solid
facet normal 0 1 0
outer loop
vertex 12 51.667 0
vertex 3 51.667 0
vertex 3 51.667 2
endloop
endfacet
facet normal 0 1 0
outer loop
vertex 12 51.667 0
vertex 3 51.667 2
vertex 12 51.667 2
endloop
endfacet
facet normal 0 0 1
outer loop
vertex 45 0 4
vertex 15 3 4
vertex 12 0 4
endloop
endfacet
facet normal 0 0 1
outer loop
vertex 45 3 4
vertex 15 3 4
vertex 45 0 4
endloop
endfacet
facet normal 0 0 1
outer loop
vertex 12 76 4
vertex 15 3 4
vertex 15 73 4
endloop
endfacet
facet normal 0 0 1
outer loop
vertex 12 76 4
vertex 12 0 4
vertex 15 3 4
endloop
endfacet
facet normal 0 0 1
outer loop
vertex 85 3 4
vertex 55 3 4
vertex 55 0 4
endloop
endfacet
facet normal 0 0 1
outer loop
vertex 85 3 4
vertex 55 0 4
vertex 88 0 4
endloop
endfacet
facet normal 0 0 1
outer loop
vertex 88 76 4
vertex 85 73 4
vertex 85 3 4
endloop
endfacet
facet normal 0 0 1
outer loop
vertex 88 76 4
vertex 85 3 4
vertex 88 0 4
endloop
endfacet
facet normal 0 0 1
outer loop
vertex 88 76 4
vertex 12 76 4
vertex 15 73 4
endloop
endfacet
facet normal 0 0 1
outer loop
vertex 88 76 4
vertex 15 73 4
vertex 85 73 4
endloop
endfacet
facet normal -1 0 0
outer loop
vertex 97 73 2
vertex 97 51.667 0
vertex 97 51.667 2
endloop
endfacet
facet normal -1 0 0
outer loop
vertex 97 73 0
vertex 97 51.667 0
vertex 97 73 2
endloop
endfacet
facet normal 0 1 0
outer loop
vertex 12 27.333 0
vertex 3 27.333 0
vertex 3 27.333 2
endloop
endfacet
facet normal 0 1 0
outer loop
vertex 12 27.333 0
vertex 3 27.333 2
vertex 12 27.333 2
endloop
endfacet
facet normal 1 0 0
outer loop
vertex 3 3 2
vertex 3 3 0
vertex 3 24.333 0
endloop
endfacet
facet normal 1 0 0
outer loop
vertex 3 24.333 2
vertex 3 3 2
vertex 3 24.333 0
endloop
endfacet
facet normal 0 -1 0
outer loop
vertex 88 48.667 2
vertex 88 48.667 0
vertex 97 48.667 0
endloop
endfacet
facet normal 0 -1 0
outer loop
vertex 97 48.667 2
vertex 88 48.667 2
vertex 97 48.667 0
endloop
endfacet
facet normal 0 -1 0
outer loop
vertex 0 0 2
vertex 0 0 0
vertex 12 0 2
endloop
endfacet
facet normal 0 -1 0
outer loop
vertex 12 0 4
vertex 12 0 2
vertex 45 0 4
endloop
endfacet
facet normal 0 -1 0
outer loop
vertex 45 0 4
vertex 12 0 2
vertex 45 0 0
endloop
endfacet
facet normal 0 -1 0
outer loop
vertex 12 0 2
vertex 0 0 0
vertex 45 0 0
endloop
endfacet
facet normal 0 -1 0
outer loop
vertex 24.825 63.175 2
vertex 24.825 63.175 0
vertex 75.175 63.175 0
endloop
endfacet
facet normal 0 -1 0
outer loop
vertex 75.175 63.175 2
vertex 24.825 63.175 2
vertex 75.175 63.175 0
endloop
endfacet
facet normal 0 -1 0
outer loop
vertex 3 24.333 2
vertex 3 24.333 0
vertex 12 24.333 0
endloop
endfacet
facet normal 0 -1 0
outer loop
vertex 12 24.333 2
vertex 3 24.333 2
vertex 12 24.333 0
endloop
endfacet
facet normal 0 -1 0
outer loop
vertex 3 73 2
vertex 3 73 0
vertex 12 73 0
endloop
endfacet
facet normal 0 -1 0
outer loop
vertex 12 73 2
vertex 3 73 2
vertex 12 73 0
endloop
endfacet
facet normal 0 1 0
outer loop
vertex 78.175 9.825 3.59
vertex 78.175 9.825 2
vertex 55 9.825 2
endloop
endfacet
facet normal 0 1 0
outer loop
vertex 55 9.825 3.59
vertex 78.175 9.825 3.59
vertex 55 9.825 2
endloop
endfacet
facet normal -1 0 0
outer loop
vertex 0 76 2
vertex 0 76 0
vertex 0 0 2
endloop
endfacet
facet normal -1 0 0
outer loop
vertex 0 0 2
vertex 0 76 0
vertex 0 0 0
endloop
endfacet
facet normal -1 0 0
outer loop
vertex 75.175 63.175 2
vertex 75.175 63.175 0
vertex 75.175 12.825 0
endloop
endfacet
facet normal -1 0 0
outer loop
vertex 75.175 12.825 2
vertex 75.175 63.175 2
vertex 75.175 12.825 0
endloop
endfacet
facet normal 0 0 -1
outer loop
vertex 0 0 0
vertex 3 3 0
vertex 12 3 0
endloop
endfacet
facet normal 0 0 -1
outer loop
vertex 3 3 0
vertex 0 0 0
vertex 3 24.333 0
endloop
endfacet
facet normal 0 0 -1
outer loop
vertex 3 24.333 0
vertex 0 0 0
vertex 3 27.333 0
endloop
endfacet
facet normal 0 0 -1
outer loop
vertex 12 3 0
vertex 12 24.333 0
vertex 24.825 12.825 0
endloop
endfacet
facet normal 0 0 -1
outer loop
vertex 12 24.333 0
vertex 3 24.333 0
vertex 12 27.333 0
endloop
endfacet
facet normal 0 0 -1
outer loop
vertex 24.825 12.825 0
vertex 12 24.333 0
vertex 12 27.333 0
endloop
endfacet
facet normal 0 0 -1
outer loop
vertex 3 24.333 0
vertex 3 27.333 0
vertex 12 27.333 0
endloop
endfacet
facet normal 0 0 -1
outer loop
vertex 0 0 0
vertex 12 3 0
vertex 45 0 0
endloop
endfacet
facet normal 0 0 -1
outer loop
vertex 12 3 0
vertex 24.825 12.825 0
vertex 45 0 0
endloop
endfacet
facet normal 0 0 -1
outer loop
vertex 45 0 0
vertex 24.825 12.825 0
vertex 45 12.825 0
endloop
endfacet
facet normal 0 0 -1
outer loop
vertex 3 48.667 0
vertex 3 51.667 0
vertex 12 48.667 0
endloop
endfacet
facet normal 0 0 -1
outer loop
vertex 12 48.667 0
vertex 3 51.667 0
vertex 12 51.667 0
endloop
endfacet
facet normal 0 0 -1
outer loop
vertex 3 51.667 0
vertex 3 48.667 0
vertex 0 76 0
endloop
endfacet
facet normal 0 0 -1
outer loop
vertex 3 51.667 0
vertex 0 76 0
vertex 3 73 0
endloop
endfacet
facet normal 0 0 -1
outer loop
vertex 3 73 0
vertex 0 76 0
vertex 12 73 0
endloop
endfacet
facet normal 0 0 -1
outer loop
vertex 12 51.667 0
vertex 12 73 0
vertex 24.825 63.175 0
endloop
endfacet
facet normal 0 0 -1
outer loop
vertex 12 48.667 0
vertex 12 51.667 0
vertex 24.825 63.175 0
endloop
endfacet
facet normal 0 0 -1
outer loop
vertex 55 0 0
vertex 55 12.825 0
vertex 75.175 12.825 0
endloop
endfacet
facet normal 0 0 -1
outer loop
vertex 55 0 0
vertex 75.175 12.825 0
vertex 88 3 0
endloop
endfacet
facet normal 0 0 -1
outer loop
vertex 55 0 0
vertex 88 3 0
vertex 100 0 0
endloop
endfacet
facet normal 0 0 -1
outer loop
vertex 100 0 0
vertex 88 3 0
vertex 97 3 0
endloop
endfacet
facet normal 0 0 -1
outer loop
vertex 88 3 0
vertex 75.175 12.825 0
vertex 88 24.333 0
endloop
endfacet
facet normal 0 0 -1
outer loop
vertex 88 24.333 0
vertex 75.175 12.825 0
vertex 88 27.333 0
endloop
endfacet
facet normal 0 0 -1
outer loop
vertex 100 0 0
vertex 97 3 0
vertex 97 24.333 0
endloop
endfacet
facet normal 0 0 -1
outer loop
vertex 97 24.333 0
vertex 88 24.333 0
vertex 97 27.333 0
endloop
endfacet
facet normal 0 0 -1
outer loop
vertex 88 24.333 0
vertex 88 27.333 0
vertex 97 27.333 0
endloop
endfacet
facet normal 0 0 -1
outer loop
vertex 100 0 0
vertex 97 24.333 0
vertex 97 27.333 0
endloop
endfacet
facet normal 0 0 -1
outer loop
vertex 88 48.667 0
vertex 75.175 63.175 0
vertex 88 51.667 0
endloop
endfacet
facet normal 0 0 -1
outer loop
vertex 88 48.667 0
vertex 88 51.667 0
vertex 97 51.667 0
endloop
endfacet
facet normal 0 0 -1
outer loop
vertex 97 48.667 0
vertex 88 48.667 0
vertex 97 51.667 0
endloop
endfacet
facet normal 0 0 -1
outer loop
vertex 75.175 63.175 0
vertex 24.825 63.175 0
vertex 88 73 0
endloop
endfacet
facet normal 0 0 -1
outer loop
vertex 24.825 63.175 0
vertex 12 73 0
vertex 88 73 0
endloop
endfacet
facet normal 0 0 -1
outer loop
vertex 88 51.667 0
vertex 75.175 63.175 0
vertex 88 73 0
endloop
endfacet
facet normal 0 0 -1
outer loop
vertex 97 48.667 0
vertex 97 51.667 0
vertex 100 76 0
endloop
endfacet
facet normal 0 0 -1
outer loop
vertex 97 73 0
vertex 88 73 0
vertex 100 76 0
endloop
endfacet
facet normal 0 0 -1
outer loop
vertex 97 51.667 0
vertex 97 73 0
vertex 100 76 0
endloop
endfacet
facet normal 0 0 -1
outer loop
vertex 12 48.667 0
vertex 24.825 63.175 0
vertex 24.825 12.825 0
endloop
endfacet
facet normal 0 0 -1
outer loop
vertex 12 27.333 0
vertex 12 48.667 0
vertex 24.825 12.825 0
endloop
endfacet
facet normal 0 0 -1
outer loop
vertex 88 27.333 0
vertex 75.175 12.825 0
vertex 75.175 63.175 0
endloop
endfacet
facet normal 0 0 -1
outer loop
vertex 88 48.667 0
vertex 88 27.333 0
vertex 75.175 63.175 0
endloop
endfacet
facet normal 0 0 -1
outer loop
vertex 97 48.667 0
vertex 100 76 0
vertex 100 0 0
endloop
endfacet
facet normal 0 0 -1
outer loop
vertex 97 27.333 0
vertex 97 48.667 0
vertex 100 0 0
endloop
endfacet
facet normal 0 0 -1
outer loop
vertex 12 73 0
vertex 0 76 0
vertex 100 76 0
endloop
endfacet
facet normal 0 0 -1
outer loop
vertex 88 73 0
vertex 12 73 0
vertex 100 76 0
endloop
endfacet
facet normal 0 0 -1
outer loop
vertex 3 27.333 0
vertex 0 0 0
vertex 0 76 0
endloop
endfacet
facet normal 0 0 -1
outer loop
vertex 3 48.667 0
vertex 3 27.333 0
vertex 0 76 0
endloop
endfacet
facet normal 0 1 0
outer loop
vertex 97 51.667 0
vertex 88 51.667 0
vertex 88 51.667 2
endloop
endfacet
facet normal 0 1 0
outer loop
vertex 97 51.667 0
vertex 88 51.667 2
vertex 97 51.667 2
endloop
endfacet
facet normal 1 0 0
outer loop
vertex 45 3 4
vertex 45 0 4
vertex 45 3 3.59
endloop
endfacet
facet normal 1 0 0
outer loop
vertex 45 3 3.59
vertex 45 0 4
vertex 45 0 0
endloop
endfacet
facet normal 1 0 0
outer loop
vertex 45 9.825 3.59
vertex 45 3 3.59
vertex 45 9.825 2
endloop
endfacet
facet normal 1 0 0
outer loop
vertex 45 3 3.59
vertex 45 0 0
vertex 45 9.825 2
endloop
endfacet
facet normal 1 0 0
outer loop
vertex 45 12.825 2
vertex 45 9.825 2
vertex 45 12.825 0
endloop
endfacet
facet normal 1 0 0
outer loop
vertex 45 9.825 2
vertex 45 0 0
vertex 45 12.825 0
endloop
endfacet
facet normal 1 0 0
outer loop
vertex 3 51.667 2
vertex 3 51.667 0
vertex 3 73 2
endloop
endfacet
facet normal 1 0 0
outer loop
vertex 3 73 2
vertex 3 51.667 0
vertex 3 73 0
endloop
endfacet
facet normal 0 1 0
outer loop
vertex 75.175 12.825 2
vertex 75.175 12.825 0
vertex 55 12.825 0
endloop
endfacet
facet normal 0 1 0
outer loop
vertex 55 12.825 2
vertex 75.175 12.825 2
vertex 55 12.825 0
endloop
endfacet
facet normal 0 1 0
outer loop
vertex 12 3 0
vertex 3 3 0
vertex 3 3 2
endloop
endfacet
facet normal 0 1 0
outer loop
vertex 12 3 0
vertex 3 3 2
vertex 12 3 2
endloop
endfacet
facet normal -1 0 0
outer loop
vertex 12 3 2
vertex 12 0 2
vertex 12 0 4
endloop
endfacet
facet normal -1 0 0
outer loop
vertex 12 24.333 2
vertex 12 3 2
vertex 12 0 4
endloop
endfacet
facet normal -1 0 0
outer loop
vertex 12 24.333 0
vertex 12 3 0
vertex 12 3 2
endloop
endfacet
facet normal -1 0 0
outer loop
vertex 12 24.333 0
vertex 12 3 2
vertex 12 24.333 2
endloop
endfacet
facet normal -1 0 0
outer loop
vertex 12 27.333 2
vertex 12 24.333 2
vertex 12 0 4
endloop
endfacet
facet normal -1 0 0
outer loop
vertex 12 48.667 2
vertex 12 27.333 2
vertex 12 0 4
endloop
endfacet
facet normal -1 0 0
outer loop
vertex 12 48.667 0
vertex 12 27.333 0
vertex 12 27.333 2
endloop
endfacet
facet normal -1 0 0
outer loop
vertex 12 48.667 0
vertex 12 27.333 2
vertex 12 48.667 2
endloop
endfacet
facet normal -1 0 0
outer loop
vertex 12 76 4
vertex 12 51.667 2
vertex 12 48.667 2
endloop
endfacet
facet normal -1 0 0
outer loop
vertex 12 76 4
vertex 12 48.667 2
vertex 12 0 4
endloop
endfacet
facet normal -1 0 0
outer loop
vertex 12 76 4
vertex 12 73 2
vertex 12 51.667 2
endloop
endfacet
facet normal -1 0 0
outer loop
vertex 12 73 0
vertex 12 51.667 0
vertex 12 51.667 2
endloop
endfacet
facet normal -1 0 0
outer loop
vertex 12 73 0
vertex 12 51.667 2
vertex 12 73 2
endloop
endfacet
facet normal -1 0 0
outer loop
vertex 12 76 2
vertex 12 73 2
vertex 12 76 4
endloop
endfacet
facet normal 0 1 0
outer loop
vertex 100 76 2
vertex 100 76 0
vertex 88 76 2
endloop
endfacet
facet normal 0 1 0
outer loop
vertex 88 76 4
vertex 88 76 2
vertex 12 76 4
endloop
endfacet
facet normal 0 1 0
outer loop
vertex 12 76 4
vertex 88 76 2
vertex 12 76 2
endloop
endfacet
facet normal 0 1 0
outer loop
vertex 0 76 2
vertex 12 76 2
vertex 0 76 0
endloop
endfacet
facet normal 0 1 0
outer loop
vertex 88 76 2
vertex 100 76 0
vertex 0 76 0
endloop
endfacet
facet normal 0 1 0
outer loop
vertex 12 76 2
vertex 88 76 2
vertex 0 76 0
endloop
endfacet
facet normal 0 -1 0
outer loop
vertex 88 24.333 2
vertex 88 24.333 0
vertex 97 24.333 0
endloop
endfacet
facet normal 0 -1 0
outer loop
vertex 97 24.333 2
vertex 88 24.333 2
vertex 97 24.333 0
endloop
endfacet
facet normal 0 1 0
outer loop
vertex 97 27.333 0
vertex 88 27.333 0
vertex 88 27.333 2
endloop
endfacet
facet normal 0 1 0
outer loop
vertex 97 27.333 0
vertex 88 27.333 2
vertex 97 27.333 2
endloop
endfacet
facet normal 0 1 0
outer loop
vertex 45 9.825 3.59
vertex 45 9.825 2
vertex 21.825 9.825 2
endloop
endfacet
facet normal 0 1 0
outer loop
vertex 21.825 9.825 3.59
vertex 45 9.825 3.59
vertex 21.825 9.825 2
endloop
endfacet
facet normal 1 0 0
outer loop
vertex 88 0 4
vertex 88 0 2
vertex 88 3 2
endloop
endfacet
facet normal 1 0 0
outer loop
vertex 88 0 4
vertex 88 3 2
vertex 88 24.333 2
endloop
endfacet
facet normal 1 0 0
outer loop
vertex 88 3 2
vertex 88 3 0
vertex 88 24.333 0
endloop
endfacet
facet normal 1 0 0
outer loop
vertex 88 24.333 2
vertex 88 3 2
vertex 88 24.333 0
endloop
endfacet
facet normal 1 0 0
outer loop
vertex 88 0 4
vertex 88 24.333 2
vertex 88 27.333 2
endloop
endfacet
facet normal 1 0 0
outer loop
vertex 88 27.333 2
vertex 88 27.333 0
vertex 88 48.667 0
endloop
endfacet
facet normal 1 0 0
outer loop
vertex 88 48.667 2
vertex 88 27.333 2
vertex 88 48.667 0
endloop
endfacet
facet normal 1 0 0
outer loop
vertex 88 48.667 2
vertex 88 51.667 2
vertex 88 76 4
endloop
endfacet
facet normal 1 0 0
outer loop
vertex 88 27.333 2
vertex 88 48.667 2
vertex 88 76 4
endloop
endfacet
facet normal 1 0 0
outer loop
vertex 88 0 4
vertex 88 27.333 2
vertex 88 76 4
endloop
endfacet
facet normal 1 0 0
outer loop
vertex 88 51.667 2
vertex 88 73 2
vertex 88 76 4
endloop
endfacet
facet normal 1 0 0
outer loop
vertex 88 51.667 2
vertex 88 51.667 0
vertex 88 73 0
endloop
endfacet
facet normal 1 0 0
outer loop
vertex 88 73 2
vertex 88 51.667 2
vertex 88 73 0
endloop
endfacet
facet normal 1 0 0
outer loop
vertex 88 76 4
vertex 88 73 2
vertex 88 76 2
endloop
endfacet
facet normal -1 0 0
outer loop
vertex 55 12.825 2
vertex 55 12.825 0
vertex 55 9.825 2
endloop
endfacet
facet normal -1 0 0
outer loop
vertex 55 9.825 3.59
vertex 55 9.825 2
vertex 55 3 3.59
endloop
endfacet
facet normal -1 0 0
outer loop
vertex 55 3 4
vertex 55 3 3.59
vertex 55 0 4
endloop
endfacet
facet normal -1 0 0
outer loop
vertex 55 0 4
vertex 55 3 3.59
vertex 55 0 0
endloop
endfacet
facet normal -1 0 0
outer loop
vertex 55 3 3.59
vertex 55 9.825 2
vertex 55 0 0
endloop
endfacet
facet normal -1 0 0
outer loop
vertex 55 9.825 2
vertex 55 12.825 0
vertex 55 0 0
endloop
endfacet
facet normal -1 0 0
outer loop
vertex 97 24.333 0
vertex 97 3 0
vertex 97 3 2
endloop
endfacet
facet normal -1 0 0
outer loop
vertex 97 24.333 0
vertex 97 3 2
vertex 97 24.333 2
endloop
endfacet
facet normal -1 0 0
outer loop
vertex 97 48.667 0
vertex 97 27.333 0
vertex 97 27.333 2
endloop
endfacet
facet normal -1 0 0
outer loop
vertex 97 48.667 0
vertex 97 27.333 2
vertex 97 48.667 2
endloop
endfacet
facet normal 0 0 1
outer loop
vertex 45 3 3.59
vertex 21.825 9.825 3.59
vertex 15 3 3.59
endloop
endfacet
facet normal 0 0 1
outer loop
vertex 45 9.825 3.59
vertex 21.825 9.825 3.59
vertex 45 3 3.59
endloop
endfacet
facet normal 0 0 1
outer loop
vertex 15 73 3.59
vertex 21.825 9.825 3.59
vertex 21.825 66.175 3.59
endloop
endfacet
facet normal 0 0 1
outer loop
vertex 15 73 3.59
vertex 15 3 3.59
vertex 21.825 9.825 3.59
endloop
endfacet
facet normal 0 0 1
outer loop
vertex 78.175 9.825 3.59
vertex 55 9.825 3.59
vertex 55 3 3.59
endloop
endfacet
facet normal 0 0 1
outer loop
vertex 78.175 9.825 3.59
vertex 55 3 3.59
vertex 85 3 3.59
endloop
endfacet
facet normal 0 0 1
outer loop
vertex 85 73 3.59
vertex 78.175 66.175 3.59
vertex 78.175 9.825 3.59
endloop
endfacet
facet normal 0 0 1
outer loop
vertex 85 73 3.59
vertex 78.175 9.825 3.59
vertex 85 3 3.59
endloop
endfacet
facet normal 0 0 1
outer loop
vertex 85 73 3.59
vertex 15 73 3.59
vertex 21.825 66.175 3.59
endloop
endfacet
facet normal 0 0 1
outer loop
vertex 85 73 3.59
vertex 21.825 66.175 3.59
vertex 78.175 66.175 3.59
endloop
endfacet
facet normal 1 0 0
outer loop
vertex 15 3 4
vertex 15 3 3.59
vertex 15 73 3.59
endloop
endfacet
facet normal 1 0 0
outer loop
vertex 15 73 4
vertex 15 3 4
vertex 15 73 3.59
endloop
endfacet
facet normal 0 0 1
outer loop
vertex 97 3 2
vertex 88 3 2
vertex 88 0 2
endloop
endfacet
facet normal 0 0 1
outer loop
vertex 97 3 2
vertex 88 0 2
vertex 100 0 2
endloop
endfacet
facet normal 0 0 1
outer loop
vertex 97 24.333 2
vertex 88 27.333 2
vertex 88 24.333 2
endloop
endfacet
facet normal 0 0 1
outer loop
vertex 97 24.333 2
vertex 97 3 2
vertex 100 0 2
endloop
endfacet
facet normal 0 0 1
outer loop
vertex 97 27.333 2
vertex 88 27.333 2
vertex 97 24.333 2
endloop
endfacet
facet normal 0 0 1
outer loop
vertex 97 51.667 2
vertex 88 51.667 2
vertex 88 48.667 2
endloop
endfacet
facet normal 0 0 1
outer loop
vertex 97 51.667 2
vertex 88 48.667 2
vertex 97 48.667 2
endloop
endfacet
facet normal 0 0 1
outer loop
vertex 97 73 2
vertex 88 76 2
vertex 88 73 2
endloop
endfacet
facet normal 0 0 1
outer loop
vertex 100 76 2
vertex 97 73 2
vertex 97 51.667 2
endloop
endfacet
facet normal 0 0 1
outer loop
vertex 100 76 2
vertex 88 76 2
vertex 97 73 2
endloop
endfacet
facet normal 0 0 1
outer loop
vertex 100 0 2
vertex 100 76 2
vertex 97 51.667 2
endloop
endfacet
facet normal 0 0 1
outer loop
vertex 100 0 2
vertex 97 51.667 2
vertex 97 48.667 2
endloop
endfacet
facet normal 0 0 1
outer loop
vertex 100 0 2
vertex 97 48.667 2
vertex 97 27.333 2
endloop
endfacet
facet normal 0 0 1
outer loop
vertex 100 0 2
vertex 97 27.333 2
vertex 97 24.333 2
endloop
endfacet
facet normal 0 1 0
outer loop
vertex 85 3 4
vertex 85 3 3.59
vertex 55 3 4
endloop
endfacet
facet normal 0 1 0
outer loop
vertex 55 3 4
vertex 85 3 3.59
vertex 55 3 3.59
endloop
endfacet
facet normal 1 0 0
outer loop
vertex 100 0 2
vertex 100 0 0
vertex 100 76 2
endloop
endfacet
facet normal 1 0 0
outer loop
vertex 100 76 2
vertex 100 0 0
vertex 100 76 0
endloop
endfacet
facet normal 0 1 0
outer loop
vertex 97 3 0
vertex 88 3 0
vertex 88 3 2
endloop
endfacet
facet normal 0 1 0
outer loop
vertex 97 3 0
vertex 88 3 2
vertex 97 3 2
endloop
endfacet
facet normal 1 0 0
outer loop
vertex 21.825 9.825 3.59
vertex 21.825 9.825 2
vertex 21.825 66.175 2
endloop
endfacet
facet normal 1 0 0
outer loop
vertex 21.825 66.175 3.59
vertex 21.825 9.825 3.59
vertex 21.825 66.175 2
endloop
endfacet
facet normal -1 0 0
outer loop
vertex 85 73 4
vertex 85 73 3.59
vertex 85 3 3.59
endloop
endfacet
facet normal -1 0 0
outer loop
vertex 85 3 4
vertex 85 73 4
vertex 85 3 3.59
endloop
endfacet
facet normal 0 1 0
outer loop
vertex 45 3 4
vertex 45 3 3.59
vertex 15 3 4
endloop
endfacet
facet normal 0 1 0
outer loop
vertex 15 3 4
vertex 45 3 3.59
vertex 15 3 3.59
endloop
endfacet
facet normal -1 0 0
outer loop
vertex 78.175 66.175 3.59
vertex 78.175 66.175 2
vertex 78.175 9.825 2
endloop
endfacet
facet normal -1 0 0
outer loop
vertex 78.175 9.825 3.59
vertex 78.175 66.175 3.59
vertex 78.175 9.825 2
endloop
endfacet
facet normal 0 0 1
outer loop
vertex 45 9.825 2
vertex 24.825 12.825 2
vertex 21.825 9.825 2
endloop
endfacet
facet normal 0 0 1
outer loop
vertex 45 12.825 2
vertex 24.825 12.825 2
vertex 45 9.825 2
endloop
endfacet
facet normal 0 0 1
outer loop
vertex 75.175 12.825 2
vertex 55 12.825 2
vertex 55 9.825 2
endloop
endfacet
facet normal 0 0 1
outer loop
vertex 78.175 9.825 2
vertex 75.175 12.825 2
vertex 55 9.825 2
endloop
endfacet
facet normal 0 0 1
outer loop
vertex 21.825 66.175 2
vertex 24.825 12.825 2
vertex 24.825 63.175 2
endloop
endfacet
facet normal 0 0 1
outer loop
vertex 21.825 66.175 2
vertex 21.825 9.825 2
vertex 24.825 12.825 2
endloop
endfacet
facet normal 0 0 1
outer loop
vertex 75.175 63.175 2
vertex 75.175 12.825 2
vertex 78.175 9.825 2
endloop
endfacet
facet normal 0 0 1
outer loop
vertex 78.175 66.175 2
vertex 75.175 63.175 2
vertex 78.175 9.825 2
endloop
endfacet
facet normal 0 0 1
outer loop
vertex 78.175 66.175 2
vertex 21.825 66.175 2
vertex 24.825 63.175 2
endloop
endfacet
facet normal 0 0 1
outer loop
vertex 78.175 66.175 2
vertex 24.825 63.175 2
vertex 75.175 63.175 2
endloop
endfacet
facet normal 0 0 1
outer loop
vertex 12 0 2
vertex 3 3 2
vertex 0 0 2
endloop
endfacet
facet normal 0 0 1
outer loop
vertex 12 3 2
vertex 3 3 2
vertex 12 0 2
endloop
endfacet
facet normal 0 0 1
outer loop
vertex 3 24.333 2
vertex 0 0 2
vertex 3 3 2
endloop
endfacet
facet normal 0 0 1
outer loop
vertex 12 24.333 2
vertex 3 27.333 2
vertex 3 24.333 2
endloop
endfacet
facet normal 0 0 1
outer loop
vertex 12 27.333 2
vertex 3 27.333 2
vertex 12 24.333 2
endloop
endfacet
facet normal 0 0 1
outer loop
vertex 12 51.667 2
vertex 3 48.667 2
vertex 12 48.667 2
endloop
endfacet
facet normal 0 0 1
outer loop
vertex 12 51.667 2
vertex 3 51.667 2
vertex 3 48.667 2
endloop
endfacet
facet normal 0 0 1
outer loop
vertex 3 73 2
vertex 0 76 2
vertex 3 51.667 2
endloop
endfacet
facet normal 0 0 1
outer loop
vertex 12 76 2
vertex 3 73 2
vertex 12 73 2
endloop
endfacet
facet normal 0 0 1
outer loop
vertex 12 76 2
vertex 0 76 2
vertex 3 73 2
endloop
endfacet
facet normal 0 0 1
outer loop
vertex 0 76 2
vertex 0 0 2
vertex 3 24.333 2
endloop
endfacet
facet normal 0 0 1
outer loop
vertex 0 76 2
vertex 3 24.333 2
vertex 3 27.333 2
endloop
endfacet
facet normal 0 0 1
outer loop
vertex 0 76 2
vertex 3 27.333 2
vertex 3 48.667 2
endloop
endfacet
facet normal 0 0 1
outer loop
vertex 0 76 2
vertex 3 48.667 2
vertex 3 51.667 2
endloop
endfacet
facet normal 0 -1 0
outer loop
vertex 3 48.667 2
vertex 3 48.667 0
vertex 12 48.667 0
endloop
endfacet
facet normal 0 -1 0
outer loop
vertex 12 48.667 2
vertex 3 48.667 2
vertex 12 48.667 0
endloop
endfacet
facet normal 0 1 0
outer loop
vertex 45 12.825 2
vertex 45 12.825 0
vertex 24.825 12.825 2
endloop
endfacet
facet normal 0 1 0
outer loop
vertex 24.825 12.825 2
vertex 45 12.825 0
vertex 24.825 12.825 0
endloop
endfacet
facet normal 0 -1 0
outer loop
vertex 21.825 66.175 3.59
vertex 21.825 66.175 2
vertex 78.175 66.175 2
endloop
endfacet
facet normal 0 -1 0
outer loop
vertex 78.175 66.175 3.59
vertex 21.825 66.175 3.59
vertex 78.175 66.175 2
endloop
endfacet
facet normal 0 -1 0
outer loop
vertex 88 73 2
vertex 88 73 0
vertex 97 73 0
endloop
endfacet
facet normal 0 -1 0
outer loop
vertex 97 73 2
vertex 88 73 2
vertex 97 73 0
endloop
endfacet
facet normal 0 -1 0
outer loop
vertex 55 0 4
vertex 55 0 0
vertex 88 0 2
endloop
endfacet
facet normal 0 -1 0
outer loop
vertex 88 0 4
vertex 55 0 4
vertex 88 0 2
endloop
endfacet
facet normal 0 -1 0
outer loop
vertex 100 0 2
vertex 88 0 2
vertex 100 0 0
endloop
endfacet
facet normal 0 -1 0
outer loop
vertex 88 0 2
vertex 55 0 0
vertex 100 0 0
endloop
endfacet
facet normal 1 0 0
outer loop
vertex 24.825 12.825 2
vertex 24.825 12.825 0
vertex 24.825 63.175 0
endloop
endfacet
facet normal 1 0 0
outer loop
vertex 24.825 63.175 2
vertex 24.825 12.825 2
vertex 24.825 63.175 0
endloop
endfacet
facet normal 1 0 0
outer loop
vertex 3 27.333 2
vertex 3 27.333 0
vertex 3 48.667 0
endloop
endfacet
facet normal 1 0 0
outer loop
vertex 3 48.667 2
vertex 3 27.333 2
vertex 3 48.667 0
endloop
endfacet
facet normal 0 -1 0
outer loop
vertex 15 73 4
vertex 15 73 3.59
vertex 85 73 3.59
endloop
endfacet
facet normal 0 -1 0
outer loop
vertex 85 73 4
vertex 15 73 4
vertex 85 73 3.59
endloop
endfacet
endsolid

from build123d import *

# Parameters (mm, degrees)
SKETCH1_W           = 9
SKETCH1_H           = 21.333333333
SKETCH1_H_2         = 21.333333334
BOSS_EXTRUDE1_DEPTH = 2
BOSS_EXTRUDE2_DEPTH = 3.59
BOSS_EXTRUDE3_DEPTH = 4


with BuildPart() as part:
    # Sketch1 → Boss-Extrude1 (new body)
    with BuildSketch(Plane.XY):
        Polygon((0, 76), (0, 0), (45, 0), (45, 12.825), (24.825, 12.825), (24.825, 63.175), (75.175, 63.175), (75.175, 12.825), (55, 12.825), (55, 0), (100, 0), (100, 76), align=None)
        with Locations((92.5, 13.666666667)):
            Rectangle(SKETCH1_W, SKETCH1_H, mode=Mode.SUBTRACT)
        with Locations((92.5, 38)):
            Rectangle(SKETCH1_W, SKETCH1_H_2, mode=Mode.SUBTRACT)
        with Locations((92.5, 62.333333334)):
            Rectangle(SKETCH1_W, SKETCH1_H, mode=Mode.SUBTRACT)
        with Locations((7.5, 62.333333334)):
            Rectangle(SKETCH1_W, SKETCH1_H, mode=Mode.SUBTRACT)
        with Locations((7.5, 38)):
            Rectangle(SKETCH1_W, SKETCH1_H_2, mode=Mode.SUBTRACT)
        with Locations((7.5, 13.666666667)):
            Rectangle(SKETCH1_W, SKETCH1_H, mode=Mode.SUBTRACT)
    extrude(amount=BOSS_EXTRUDE1_DEPTH)

    # Sketch1<3> → Boss-Extrude2 (add)
    with BuildSketch(Plane.XY):
        Polygon((15, 3), (45, 3), (45, 9.825), (21.825, 9.825), (21.825, 66.175), (78.175, 66.175), (78.175, 9.825), (55, 9.825), (55, 3), (85, 3), (85, 73), (15, 73), align=None)
    extrude(amount=BOSS_EXTRUDE2_DEPTH)

    # Sketch1<4> → Boss-Extrude3 (add)
    with BuildSketch(Plane.XY):
        Polygon((12, 3), (12, 0), (45, 0), (45, 3), (15, 3), (15, 73), (85, 73), (85, 3), (55, 3), (55, 0), (88, 0), (88, 3), (88, 24.333333333), (88, 27.333333333), (88, 48.666666667), (88, 51.666666667), (88, 73), (88, 76), (12, 76), (12, 73), (12, 51.666666667), (12, 48.666666667), (12, 27.333333333), (12, 24.333333333), align=None)
    extrude(amount=BOSS_EXTRUDE3_DEPTH)


solid = part.part
